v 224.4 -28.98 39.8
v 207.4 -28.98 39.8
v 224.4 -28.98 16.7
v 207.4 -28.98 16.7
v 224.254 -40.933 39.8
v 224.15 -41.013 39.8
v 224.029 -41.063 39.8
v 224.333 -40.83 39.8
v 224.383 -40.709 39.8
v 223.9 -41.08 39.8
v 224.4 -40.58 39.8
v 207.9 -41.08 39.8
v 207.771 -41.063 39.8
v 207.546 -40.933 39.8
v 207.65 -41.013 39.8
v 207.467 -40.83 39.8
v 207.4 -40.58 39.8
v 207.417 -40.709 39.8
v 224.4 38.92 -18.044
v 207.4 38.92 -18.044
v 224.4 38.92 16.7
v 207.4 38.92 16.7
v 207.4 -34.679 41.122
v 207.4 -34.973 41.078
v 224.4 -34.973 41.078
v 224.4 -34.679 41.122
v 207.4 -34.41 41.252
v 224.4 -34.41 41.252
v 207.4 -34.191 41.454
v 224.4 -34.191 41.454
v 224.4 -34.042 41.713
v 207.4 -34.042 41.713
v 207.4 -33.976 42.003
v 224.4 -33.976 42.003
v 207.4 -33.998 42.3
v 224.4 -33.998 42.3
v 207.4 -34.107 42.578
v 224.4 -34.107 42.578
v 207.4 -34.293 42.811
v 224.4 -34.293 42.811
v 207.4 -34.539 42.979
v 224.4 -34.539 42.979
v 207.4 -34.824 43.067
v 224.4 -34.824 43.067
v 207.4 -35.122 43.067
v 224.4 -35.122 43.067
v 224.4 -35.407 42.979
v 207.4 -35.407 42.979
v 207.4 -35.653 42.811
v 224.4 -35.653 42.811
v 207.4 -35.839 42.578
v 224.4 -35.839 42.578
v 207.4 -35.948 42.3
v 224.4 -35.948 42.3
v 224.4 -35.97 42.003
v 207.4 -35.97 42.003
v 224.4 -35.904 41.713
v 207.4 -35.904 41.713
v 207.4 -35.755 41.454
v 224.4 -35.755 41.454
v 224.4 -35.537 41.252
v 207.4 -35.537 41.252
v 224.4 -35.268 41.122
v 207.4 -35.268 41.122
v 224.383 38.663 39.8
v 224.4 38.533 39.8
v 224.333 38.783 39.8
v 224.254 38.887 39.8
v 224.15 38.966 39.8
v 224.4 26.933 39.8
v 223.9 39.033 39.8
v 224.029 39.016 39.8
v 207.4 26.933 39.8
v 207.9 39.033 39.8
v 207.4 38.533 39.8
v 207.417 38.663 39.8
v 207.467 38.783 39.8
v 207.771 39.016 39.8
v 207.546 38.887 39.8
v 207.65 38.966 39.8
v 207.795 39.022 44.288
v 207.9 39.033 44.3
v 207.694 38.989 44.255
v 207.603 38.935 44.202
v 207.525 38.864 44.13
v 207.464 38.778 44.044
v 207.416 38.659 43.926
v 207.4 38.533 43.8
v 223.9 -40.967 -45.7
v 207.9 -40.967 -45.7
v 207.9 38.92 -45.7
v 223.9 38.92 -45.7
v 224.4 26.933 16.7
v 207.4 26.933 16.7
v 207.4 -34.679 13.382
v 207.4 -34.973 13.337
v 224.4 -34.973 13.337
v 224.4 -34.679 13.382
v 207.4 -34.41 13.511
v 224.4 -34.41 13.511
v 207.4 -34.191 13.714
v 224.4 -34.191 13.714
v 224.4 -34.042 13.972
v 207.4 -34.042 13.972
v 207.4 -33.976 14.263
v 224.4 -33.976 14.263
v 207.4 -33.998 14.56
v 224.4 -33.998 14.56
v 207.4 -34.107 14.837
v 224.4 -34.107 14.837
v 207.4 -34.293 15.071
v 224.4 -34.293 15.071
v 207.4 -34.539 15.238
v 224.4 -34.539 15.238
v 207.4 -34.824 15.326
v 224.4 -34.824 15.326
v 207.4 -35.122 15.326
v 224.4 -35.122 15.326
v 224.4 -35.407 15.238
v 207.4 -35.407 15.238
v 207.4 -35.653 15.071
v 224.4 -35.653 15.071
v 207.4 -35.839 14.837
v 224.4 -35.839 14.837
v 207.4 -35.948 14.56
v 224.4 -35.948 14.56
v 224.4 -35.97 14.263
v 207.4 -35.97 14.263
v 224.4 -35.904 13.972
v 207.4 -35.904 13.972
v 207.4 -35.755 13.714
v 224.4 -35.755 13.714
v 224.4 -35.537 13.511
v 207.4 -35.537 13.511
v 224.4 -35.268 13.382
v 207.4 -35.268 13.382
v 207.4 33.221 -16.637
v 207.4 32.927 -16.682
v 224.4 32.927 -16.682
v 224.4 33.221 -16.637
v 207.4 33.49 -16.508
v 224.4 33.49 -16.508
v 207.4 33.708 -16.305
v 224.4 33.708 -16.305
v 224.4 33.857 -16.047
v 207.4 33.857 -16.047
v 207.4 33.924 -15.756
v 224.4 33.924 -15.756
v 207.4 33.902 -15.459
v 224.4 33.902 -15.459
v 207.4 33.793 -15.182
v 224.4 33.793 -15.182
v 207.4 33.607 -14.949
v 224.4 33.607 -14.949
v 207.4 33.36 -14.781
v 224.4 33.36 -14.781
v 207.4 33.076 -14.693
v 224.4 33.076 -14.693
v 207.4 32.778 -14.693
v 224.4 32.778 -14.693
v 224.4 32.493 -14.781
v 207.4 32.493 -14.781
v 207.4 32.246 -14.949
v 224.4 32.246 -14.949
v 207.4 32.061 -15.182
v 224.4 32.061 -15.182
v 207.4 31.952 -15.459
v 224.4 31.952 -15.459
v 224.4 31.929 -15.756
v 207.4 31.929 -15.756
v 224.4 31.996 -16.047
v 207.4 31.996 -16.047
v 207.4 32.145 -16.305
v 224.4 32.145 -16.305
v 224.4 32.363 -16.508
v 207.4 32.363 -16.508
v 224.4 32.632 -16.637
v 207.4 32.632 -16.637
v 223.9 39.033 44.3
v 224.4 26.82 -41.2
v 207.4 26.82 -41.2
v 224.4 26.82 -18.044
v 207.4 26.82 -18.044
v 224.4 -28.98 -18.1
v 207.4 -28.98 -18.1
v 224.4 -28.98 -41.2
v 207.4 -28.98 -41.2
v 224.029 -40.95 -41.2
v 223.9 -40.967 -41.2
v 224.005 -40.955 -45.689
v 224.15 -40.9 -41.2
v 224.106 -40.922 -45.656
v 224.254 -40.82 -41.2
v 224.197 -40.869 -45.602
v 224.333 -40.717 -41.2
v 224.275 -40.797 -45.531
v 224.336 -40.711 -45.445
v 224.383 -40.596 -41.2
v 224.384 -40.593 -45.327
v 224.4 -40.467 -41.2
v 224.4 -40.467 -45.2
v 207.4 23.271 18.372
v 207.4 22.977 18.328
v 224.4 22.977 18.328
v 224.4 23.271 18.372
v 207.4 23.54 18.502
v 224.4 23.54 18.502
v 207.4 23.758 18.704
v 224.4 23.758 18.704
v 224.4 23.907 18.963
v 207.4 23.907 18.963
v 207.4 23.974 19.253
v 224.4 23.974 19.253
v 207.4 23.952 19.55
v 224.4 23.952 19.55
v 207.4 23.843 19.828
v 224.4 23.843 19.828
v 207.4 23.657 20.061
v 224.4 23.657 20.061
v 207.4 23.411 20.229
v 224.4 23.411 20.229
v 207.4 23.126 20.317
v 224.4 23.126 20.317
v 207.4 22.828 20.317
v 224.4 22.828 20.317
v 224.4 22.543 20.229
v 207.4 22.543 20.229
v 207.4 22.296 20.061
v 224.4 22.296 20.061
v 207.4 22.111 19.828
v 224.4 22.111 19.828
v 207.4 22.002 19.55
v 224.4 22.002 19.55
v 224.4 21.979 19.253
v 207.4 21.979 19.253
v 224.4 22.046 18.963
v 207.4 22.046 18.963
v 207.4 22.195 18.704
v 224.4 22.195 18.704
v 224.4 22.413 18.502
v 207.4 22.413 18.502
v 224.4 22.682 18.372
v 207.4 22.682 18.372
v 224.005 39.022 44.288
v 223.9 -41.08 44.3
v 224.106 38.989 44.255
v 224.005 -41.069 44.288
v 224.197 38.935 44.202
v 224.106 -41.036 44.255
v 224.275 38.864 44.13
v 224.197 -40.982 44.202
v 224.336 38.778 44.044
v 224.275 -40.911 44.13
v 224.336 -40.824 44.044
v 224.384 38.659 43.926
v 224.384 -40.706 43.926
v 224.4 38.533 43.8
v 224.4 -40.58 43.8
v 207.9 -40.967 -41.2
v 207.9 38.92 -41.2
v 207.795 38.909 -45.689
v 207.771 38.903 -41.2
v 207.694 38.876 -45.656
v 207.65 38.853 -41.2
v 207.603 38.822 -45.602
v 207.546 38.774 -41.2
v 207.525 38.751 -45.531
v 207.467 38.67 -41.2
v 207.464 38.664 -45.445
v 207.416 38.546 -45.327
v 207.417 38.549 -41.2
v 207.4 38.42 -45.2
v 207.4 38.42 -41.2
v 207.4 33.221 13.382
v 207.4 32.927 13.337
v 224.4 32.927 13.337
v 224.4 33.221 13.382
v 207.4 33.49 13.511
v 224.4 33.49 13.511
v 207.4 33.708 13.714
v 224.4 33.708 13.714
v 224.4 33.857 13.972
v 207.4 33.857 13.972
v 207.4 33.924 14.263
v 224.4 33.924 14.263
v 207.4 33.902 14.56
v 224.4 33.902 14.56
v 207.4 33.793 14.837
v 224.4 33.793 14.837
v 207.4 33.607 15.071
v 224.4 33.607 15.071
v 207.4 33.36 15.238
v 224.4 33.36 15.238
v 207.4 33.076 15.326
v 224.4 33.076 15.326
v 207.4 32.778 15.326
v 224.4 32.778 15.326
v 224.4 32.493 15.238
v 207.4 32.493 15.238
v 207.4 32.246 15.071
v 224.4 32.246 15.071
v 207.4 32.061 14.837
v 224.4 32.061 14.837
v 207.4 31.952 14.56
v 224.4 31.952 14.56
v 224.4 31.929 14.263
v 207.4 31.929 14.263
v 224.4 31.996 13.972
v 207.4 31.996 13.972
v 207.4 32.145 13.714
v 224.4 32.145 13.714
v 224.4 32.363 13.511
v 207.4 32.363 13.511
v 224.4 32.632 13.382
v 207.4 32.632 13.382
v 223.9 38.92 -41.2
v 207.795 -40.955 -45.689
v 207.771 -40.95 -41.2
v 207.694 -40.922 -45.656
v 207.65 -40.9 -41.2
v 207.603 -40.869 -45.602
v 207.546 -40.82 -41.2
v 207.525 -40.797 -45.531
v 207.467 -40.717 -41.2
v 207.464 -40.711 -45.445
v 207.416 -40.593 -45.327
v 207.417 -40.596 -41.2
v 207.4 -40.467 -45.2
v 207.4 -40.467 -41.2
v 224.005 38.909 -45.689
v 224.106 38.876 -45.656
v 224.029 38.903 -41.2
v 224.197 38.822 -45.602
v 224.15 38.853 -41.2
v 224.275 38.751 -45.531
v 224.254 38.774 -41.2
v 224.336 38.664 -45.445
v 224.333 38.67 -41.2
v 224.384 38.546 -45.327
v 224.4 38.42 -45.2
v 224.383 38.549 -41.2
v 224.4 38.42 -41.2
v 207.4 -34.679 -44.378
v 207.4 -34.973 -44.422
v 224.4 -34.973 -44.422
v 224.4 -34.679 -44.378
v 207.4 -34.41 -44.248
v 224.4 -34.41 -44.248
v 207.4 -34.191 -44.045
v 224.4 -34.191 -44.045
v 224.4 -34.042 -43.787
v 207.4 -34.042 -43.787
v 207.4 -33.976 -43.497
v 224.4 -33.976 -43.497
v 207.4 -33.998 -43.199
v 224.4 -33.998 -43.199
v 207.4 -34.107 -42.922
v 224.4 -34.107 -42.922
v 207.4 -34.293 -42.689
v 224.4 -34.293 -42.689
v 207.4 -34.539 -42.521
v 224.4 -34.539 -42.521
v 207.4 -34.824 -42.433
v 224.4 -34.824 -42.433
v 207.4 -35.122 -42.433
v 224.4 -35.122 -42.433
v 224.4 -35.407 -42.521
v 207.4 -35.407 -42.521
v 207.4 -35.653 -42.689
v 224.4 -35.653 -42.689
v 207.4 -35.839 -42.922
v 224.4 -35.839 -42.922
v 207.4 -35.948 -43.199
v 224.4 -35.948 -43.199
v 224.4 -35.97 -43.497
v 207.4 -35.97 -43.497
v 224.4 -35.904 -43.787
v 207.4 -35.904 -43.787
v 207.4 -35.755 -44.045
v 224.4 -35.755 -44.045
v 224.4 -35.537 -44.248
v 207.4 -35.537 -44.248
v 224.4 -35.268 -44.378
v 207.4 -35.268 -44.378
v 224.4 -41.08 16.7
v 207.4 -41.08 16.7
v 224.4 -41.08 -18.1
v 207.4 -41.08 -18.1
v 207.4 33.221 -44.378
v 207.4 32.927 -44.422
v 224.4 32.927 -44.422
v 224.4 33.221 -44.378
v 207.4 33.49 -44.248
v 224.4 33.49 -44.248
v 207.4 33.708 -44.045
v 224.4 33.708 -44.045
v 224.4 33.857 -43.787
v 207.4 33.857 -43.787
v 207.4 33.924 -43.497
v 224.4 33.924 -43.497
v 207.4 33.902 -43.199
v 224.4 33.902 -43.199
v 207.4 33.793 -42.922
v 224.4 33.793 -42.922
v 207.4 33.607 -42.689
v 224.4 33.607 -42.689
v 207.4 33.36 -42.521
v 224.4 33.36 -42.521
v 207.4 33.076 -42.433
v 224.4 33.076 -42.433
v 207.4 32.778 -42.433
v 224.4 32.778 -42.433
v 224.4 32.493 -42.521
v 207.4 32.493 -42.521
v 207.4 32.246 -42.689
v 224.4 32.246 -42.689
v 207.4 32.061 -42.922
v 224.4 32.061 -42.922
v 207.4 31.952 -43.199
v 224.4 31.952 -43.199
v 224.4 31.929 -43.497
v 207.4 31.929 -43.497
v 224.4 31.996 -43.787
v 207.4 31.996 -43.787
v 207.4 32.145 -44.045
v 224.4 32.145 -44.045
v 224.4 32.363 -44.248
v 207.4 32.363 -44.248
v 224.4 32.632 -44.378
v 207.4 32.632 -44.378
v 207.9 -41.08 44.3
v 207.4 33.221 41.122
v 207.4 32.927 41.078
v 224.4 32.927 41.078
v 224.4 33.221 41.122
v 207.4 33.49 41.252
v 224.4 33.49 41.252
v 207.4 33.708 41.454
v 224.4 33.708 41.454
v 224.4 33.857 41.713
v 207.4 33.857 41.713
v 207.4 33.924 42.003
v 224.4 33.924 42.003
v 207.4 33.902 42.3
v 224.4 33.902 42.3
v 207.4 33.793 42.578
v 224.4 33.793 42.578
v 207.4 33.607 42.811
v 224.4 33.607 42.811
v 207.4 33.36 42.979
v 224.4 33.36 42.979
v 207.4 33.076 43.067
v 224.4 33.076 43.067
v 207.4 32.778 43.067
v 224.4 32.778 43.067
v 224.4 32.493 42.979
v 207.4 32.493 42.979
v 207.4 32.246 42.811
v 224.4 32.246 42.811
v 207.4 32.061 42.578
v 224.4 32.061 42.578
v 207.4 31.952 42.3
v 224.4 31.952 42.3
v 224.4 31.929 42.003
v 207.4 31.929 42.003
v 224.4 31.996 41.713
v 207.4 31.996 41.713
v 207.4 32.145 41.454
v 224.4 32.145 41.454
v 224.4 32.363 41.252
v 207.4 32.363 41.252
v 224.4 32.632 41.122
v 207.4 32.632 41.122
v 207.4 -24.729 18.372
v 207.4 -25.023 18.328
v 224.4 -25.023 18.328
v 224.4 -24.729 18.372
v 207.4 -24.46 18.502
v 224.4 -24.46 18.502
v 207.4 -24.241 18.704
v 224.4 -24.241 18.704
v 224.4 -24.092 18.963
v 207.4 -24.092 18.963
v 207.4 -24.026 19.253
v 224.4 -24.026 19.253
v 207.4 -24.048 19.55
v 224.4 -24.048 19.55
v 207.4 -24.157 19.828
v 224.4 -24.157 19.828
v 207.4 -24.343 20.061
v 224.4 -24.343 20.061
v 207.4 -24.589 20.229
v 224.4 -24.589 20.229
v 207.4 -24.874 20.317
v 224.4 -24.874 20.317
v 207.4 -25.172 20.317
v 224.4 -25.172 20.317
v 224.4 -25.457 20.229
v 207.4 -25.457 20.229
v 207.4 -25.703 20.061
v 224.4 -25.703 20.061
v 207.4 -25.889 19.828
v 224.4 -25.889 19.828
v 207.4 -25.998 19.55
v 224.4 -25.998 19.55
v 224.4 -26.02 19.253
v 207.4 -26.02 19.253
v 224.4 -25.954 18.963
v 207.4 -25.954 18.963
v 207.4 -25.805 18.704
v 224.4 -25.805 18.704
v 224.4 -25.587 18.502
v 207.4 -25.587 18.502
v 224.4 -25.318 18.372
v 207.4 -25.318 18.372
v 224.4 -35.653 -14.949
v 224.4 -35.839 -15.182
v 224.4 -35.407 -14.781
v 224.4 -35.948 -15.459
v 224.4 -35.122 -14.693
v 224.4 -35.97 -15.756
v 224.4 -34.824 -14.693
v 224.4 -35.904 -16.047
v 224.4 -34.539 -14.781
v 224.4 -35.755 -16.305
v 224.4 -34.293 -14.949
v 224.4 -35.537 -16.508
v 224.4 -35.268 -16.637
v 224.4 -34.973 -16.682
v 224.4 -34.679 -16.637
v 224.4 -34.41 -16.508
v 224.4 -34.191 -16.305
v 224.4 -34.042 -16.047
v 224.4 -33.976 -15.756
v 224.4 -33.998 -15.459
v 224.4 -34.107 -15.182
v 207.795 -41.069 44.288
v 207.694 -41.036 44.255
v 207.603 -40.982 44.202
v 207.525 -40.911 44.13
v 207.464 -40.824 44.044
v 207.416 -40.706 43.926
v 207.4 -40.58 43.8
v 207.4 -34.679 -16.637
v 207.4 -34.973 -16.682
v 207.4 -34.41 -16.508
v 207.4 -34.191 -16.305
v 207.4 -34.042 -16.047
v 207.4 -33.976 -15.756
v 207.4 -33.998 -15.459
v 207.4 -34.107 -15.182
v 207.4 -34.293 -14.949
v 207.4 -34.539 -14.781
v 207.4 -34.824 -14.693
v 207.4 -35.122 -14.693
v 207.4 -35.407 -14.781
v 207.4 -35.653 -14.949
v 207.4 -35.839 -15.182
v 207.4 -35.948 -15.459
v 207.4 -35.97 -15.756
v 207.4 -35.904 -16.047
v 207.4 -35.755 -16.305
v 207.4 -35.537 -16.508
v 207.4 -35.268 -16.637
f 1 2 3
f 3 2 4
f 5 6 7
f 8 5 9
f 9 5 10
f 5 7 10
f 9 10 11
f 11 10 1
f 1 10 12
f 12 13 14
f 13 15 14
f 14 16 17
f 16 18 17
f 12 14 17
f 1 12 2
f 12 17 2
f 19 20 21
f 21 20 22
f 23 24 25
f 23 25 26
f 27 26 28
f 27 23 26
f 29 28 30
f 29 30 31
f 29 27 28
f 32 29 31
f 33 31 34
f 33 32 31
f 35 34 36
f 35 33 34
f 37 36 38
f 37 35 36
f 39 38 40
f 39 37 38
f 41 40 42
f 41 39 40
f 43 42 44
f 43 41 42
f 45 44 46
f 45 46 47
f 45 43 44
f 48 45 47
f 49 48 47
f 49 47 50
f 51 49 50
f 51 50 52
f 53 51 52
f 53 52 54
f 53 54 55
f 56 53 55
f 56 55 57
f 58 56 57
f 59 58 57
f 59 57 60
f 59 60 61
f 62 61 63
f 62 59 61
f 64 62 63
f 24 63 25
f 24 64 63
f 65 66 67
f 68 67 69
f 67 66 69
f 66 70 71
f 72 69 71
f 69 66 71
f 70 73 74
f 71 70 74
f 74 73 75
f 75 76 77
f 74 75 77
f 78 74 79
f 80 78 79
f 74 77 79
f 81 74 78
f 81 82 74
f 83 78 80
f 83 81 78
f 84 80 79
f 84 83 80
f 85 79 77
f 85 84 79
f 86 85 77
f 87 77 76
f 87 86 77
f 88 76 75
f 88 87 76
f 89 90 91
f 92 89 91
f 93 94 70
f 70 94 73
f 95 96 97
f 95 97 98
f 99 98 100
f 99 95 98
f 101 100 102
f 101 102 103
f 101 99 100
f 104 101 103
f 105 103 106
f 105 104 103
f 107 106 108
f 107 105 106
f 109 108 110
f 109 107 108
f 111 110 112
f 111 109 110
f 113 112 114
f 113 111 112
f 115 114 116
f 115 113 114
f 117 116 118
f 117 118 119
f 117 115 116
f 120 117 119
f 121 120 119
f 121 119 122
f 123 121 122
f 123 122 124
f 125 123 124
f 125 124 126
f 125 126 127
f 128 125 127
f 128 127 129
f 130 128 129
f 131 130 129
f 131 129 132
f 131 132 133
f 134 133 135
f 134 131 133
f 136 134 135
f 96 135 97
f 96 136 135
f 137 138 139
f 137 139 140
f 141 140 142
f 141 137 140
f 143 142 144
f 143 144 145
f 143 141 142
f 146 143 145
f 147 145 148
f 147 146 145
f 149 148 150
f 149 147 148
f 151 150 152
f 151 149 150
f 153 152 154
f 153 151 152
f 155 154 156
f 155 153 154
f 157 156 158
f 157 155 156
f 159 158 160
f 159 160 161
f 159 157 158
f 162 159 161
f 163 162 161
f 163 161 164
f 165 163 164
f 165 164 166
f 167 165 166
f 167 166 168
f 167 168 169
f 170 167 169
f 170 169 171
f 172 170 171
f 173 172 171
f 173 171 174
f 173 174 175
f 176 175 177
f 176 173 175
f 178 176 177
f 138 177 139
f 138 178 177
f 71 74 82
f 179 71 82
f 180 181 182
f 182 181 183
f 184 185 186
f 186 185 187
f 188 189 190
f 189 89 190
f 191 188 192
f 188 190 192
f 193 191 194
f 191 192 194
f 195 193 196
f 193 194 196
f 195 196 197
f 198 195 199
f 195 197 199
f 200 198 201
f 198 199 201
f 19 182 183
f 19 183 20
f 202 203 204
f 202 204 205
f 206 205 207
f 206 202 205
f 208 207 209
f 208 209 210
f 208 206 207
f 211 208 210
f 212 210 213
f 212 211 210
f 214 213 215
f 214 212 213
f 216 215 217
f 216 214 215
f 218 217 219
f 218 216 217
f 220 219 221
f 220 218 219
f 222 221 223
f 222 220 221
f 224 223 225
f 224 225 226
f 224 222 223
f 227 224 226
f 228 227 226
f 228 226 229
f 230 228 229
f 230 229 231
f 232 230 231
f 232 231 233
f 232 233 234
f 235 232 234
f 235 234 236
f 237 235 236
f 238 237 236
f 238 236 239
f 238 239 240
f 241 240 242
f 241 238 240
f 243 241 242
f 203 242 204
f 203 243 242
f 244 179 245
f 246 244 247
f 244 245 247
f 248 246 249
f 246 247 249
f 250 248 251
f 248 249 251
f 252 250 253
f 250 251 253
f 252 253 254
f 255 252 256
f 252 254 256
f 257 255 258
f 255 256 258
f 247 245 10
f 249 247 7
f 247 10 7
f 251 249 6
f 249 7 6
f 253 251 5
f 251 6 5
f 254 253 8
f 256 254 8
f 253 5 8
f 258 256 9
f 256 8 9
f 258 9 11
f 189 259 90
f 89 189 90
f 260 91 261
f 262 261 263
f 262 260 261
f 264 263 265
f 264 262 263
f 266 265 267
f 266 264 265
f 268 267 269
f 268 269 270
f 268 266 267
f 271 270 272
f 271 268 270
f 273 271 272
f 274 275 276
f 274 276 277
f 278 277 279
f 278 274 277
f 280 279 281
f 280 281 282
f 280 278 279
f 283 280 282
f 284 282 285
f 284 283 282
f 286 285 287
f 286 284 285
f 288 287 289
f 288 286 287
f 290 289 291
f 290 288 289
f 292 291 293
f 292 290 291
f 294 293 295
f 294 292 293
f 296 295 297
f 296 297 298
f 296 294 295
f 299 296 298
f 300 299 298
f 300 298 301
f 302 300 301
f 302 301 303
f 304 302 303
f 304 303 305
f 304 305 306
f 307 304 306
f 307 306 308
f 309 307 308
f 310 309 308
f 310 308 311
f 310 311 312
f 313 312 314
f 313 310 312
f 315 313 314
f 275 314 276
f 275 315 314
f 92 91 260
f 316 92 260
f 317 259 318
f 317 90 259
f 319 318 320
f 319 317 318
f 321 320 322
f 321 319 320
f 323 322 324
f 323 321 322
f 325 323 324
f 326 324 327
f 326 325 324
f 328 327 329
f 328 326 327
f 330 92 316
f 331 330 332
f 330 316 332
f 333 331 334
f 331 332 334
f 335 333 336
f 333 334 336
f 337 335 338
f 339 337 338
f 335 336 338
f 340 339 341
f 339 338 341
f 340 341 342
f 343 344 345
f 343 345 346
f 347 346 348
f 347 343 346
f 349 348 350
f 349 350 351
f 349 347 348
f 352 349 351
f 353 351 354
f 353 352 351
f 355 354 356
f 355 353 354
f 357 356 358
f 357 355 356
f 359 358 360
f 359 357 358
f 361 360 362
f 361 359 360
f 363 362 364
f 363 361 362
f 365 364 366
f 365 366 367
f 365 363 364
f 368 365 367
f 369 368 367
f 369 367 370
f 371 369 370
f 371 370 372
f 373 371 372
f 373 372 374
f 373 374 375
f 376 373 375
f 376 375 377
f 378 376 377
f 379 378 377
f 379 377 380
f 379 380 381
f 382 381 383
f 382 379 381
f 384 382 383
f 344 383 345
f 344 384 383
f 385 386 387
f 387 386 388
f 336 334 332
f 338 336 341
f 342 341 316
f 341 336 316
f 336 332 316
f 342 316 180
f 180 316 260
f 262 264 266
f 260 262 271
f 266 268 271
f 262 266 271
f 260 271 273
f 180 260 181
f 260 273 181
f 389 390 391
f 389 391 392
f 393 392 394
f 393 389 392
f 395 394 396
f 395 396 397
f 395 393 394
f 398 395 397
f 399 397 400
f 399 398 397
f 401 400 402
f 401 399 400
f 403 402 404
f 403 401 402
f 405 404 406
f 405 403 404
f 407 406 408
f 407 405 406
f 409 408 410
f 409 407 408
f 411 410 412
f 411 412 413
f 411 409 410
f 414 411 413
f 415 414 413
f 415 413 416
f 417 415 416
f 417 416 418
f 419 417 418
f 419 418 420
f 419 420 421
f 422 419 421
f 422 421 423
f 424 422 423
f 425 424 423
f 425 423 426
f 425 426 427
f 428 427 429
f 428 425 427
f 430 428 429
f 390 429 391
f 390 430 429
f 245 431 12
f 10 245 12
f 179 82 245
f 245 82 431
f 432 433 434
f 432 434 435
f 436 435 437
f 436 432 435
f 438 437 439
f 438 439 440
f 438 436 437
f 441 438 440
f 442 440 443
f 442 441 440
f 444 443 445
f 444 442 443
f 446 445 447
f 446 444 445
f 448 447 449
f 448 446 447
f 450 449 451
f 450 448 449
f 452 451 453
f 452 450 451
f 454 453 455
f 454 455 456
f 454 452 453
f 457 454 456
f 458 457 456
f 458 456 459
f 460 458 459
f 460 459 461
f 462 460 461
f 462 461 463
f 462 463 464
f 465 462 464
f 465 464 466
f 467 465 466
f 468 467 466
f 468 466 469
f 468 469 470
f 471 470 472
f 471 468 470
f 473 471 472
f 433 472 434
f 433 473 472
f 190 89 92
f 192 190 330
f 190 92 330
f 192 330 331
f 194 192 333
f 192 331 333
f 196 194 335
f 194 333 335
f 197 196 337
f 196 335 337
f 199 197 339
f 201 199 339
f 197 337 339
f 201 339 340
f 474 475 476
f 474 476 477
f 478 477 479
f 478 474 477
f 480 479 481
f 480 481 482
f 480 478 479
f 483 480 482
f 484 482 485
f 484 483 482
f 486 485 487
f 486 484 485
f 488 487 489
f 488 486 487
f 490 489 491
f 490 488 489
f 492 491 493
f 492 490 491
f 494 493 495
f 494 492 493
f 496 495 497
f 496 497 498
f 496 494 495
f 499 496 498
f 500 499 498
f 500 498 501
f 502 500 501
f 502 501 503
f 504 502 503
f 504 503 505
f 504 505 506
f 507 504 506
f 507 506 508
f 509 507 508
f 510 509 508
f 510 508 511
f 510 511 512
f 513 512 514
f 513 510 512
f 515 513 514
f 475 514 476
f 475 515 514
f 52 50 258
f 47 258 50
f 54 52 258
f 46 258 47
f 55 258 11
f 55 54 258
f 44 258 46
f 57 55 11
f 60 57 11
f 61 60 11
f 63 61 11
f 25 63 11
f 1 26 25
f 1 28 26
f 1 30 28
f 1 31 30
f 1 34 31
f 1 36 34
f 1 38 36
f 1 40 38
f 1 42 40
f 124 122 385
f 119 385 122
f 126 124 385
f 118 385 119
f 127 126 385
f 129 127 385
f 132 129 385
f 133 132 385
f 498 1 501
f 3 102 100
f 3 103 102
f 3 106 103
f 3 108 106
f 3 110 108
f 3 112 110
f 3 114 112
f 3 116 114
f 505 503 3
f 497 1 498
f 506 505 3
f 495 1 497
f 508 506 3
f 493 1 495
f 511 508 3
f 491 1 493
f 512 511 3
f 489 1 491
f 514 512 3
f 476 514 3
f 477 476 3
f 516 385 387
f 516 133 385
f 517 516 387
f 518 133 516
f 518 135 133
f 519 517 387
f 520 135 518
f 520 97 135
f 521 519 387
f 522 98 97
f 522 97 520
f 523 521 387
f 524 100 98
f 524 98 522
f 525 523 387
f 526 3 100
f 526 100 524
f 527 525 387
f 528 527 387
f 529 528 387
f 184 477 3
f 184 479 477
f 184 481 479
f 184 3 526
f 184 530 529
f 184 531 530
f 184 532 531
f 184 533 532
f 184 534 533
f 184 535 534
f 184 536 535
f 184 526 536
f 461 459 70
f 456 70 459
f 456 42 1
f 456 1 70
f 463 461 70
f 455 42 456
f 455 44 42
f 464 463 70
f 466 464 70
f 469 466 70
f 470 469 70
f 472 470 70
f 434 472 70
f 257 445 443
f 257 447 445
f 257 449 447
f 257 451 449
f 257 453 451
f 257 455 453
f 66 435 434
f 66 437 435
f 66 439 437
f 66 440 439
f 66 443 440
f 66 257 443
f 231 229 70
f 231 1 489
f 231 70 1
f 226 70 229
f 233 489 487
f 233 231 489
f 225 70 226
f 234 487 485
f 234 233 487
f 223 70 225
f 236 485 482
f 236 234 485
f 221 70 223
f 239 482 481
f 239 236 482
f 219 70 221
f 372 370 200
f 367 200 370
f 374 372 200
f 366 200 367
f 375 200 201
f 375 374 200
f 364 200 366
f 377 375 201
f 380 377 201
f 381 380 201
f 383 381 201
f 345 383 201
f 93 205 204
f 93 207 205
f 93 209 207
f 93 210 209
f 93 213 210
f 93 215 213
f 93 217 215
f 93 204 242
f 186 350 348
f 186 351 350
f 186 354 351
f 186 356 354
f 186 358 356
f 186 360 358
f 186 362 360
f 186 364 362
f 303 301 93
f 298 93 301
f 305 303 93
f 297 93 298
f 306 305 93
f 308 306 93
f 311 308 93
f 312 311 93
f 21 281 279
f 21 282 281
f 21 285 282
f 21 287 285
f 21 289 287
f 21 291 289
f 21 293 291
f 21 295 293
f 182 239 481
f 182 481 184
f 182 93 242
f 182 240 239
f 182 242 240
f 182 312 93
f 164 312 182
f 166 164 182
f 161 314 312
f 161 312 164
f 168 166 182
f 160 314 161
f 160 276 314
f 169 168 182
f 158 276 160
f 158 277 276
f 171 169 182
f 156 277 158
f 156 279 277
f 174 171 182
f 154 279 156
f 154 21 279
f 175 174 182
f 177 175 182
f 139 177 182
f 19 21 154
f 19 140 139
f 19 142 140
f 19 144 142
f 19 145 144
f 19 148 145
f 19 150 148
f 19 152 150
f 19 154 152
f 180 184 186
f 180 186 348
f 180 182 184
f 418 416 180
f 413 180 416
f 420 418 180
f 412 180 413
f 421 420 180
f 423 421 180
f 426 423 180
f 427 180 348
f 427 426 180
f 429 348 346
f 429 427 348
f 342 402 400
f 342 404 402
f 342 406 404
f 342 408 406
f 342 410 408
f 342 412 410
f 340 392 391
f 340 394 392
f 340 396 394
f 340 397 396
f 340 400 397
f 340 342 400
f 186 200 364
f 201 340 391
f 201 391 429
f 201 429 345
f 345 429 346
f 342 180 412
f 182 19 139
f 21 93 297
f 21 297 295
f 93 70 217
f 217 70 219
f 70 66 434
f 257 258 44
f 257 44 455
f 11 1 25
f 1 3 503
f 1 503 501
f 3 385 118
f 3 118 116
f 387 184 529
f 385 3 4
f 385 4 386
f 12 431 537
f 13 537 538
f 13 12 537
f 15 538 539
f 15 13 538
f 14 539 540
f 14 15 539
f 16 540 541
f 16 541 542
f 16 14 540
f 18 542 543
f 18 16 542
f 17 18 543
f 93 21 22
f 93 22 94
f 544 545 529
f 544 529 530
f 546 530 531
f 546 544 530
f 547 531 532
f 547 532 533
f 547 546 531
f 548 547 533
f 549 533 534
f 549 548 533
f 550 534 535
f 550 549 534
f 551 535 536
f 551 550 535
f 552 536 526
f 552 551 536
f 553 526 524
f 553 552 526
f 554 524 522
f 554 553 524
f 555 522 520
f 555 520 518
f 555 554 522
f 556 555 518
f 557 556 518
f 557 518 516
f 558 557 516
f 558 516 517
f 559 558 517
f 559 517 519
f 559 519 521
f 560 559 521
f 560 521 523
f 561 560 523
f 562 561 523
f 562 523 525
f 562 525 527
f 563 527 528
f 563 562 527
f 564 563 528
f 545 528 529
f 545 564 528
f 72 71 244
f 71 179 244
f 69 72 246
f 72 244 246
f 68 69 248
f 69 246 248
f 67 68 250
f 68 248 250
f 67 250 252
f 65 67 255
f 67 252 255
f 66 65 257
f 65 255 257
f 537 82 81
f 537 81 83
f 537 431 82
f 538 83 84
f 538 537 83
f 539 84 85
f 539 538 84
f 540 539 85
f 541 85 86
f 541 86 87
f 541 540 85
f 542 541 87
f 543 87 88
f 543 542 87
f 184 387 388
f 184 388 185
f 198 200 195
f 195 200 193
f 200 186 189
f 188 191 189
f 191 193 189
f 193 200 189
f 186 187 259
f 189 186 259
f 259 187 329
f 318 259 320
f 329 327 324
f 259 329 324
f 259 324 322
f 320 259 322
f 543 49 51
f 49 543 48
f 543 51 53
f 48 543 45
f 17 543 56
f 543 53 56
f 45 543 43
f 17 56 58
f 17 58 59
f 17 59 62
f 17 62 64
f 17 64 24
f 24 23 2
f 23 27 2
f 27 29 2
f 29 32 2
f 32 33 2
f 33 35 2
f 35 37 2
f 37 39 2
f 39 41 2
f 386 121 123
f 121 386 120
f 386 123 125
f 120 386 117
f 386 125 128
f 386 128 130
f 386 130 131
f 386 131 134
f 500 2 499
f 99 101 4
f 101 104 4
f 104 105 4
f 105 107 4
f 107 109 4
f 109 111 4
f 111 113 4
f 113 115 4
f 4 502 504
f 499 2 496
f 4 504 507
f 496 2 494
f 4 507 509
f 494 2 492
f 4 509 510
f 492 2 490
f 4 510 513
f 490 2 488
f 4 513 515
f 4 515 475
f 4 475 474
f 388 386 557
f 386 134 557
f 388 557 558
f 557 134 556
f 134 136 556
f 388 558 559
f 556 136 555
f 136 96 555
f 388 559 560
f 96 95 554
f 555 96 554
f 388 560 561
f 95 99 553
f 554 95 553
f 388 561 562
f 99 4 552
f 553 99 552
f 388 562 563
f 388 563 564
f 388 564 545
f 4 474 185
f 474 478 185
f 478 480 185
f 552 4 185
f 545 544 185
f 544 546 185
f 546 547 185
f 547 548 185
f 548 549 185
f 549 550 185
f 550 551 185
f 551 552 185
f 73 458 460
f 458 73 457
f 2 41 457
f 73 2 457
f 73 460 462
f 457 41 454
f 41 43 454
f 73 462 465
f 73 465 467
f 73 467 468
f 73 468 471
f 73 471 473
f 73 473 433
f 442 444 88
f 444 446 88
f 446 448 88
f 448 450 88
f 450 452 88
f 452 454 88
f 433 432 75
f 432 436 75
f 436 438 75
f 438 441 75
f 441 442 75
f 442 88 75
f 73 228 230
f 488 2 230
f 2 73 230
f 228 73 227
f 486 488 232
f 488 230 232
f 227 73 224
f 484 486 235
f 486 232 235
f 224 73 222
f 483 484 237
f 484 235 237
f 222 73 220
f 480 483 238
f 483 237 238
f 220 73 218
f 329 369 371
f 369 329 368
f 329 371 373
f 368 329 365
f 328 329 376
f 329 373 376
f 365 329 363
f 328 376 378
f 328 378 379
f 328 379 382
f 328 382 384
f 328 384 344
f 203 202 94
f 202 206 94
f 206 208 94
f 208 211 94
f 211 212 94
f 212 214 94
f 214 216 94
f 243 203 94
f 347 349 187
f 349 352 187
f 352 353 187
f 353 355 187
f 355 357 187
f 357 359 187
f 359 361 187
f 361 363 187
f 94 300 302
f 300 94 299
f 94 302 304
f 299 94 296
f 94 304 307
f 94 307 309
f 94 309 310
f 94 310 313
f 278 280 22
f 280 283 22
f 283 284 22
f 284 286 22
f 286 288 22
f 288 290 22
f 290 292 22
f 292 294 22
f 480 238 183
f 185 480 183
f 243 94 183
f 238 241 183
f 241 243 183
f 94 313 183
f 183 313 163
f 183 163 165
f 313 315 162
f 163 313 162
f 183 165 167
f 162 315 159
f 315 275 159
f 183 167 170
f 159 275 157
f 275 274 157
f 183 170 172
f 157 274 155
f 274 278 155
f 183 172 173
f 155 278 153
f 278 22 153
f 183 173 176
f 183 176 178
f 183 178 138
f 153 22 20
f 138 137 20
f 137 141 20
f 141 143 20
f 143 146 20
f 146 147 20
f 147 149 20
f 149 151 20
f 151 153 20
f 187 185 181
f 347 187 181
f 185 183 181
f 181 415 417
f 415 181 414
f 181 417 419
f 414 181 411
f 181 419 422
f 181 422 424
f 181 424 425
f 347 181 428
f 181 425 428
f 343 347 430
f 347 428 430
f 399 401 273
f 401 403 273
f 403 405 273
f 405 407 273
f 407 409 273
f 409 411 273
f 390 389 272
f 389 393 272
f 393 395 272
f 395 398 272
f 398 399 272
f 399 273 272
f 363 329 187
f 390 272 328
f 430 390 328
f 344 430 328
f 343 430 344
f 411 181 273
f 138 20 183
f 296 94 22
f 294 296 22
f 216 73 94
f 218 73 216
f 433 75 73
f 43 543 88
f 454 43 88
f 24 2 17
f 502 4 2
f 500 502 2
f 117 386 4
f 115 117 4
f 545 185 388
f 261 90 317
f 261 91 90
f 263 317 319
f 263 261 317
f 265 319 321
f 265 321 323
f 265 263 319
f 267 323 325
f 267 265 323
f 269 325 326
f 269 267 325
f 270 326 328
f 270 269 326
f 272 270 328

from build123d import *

# Parameters (mm, degrees)
SKETCH2_R           = 25.4
BOSS_EXTRUDE2_DEPTH = 431.8
SCALE1_SCALE        = 0.03937
FILLET2_R           = 0.5


with BuildPart() as part:
    # Sketch2 → Boss-Extrude2 (new body)
    with BuildSketch(Plane(origin=(0, 0, 0), x_dir=(0, 0, -1), z_dir=(1, 0, 0))):
        Polygon((-1142.280911006, -609.6), (-1142.280911006, -1017.438177988), (-1027.980911006, -1017.438177988), (-1027.980911006, -710.098177988), (-441.240911006, -710.098177988), (-441.240911006, -1017.438177988), (0, -1017.438177988), (442.679088994, -1017.438177988), (442.679088994, -710.098177988), (1029.419088994, -710.098177988), (1029.419088994, -1014.561822012), (1143.719088994, -1014.561822012), (1143.719088994, 1014.561822012), (1029.419088994, 1014.561822012), (1029.419088994, 707.221822012), (441.240911006, 707.221822012), (441.240911006, 1014.561822012), (-441.240911006, 1014.561822012), (-441.240911006, 710.098177988), (-1027.980911006, 710.098177988), (-1027.980911006, 1017.438177988), (-1142.280911006, 1017.438177988), (-1142.280911006, 460.3506922), (-1142.280911006, 0), align=None)
        with Locations((-1085.85, -862.33)):
            Circle(SKETCH2_R, mode=Mode.SUBTRACT)
        with Locations((-381.2428494, -862.33)):
            Circle(SKETCH2_R, mode=Mode.SUBTRACT)
        with Locations((-508, -609.6)):
            Circle(SKETCH2_R, mode=Mode.SUBTRACT)
        with Locations((381.2428494, -862.33)):
            Circle(SKETCH2_R, mode=Mode.SUBTRACT)
        with Locations((1085.85, -862.33)):
            Circle(SKETCH2_R, mode=Mode.SUBTRACT)
        with Locations((-1085.85, 862.33)):
            Circle(SKETCH2_R, mode=Mode.SUBTRACT)
        with Locations((-508, 609.6)):
            Circle(SKETCH2_R, mode=Mode.SUBTRACT)
        with Locations((-381.2428494, 862.33)):
            Circle(SKETCH2_R, mode=Mode.SUBTRACT)
        with Locations((381.2428494, 862.33)):
            Circle(SKETCH2_R, mode=Mode.SUBTRACT)
        with Locations((1085.85, 862.33)):
            Circle(SKETCH2_R, mode=Mode.SUBTRACT)
    extrude(amount=BOSS_EXTRUDE2_DEPTH)


with BuildPart() as part_1:
    # Scale1: scaled about (215.9, -1.065263606, -0.699579786)
    add(part.part.scale(SCALE1_SCALE).moved(Location((207.400017, -1.023324178, -0.67203733))))

    # Fillet2
    fillet2_edges = [part_1.edges().sort_by_distance(p)[0] for p in [
        (207.400017, -40.96662311, -43.450262364),
        (207.400017, -1.023324178, -45.700257864),
        (207.400017, 38.919974755, -43.450262364),
        (207.400017, 39.03321689, 42.049566636),
        (207.400017, -1.023324178, 44.299562136),
        (207.400017, -41.079865245, 42.049566636),
        (224.399983, -41.079865245, 42.049566636),
        (224.399983, -1.023324178, 44.299562136),
        (224.399983, 39.03321689, 42.049566636),
        (224.399983, 38.919974755, -43.450262364),
        (224.399983, -1.023324178, -45.700257864),
        (224.399983, -40.96662311, -43.450262364),
    ]]
    fillet(fillet2_edges, radius=FILLET2_R)


solid = part_1.part
